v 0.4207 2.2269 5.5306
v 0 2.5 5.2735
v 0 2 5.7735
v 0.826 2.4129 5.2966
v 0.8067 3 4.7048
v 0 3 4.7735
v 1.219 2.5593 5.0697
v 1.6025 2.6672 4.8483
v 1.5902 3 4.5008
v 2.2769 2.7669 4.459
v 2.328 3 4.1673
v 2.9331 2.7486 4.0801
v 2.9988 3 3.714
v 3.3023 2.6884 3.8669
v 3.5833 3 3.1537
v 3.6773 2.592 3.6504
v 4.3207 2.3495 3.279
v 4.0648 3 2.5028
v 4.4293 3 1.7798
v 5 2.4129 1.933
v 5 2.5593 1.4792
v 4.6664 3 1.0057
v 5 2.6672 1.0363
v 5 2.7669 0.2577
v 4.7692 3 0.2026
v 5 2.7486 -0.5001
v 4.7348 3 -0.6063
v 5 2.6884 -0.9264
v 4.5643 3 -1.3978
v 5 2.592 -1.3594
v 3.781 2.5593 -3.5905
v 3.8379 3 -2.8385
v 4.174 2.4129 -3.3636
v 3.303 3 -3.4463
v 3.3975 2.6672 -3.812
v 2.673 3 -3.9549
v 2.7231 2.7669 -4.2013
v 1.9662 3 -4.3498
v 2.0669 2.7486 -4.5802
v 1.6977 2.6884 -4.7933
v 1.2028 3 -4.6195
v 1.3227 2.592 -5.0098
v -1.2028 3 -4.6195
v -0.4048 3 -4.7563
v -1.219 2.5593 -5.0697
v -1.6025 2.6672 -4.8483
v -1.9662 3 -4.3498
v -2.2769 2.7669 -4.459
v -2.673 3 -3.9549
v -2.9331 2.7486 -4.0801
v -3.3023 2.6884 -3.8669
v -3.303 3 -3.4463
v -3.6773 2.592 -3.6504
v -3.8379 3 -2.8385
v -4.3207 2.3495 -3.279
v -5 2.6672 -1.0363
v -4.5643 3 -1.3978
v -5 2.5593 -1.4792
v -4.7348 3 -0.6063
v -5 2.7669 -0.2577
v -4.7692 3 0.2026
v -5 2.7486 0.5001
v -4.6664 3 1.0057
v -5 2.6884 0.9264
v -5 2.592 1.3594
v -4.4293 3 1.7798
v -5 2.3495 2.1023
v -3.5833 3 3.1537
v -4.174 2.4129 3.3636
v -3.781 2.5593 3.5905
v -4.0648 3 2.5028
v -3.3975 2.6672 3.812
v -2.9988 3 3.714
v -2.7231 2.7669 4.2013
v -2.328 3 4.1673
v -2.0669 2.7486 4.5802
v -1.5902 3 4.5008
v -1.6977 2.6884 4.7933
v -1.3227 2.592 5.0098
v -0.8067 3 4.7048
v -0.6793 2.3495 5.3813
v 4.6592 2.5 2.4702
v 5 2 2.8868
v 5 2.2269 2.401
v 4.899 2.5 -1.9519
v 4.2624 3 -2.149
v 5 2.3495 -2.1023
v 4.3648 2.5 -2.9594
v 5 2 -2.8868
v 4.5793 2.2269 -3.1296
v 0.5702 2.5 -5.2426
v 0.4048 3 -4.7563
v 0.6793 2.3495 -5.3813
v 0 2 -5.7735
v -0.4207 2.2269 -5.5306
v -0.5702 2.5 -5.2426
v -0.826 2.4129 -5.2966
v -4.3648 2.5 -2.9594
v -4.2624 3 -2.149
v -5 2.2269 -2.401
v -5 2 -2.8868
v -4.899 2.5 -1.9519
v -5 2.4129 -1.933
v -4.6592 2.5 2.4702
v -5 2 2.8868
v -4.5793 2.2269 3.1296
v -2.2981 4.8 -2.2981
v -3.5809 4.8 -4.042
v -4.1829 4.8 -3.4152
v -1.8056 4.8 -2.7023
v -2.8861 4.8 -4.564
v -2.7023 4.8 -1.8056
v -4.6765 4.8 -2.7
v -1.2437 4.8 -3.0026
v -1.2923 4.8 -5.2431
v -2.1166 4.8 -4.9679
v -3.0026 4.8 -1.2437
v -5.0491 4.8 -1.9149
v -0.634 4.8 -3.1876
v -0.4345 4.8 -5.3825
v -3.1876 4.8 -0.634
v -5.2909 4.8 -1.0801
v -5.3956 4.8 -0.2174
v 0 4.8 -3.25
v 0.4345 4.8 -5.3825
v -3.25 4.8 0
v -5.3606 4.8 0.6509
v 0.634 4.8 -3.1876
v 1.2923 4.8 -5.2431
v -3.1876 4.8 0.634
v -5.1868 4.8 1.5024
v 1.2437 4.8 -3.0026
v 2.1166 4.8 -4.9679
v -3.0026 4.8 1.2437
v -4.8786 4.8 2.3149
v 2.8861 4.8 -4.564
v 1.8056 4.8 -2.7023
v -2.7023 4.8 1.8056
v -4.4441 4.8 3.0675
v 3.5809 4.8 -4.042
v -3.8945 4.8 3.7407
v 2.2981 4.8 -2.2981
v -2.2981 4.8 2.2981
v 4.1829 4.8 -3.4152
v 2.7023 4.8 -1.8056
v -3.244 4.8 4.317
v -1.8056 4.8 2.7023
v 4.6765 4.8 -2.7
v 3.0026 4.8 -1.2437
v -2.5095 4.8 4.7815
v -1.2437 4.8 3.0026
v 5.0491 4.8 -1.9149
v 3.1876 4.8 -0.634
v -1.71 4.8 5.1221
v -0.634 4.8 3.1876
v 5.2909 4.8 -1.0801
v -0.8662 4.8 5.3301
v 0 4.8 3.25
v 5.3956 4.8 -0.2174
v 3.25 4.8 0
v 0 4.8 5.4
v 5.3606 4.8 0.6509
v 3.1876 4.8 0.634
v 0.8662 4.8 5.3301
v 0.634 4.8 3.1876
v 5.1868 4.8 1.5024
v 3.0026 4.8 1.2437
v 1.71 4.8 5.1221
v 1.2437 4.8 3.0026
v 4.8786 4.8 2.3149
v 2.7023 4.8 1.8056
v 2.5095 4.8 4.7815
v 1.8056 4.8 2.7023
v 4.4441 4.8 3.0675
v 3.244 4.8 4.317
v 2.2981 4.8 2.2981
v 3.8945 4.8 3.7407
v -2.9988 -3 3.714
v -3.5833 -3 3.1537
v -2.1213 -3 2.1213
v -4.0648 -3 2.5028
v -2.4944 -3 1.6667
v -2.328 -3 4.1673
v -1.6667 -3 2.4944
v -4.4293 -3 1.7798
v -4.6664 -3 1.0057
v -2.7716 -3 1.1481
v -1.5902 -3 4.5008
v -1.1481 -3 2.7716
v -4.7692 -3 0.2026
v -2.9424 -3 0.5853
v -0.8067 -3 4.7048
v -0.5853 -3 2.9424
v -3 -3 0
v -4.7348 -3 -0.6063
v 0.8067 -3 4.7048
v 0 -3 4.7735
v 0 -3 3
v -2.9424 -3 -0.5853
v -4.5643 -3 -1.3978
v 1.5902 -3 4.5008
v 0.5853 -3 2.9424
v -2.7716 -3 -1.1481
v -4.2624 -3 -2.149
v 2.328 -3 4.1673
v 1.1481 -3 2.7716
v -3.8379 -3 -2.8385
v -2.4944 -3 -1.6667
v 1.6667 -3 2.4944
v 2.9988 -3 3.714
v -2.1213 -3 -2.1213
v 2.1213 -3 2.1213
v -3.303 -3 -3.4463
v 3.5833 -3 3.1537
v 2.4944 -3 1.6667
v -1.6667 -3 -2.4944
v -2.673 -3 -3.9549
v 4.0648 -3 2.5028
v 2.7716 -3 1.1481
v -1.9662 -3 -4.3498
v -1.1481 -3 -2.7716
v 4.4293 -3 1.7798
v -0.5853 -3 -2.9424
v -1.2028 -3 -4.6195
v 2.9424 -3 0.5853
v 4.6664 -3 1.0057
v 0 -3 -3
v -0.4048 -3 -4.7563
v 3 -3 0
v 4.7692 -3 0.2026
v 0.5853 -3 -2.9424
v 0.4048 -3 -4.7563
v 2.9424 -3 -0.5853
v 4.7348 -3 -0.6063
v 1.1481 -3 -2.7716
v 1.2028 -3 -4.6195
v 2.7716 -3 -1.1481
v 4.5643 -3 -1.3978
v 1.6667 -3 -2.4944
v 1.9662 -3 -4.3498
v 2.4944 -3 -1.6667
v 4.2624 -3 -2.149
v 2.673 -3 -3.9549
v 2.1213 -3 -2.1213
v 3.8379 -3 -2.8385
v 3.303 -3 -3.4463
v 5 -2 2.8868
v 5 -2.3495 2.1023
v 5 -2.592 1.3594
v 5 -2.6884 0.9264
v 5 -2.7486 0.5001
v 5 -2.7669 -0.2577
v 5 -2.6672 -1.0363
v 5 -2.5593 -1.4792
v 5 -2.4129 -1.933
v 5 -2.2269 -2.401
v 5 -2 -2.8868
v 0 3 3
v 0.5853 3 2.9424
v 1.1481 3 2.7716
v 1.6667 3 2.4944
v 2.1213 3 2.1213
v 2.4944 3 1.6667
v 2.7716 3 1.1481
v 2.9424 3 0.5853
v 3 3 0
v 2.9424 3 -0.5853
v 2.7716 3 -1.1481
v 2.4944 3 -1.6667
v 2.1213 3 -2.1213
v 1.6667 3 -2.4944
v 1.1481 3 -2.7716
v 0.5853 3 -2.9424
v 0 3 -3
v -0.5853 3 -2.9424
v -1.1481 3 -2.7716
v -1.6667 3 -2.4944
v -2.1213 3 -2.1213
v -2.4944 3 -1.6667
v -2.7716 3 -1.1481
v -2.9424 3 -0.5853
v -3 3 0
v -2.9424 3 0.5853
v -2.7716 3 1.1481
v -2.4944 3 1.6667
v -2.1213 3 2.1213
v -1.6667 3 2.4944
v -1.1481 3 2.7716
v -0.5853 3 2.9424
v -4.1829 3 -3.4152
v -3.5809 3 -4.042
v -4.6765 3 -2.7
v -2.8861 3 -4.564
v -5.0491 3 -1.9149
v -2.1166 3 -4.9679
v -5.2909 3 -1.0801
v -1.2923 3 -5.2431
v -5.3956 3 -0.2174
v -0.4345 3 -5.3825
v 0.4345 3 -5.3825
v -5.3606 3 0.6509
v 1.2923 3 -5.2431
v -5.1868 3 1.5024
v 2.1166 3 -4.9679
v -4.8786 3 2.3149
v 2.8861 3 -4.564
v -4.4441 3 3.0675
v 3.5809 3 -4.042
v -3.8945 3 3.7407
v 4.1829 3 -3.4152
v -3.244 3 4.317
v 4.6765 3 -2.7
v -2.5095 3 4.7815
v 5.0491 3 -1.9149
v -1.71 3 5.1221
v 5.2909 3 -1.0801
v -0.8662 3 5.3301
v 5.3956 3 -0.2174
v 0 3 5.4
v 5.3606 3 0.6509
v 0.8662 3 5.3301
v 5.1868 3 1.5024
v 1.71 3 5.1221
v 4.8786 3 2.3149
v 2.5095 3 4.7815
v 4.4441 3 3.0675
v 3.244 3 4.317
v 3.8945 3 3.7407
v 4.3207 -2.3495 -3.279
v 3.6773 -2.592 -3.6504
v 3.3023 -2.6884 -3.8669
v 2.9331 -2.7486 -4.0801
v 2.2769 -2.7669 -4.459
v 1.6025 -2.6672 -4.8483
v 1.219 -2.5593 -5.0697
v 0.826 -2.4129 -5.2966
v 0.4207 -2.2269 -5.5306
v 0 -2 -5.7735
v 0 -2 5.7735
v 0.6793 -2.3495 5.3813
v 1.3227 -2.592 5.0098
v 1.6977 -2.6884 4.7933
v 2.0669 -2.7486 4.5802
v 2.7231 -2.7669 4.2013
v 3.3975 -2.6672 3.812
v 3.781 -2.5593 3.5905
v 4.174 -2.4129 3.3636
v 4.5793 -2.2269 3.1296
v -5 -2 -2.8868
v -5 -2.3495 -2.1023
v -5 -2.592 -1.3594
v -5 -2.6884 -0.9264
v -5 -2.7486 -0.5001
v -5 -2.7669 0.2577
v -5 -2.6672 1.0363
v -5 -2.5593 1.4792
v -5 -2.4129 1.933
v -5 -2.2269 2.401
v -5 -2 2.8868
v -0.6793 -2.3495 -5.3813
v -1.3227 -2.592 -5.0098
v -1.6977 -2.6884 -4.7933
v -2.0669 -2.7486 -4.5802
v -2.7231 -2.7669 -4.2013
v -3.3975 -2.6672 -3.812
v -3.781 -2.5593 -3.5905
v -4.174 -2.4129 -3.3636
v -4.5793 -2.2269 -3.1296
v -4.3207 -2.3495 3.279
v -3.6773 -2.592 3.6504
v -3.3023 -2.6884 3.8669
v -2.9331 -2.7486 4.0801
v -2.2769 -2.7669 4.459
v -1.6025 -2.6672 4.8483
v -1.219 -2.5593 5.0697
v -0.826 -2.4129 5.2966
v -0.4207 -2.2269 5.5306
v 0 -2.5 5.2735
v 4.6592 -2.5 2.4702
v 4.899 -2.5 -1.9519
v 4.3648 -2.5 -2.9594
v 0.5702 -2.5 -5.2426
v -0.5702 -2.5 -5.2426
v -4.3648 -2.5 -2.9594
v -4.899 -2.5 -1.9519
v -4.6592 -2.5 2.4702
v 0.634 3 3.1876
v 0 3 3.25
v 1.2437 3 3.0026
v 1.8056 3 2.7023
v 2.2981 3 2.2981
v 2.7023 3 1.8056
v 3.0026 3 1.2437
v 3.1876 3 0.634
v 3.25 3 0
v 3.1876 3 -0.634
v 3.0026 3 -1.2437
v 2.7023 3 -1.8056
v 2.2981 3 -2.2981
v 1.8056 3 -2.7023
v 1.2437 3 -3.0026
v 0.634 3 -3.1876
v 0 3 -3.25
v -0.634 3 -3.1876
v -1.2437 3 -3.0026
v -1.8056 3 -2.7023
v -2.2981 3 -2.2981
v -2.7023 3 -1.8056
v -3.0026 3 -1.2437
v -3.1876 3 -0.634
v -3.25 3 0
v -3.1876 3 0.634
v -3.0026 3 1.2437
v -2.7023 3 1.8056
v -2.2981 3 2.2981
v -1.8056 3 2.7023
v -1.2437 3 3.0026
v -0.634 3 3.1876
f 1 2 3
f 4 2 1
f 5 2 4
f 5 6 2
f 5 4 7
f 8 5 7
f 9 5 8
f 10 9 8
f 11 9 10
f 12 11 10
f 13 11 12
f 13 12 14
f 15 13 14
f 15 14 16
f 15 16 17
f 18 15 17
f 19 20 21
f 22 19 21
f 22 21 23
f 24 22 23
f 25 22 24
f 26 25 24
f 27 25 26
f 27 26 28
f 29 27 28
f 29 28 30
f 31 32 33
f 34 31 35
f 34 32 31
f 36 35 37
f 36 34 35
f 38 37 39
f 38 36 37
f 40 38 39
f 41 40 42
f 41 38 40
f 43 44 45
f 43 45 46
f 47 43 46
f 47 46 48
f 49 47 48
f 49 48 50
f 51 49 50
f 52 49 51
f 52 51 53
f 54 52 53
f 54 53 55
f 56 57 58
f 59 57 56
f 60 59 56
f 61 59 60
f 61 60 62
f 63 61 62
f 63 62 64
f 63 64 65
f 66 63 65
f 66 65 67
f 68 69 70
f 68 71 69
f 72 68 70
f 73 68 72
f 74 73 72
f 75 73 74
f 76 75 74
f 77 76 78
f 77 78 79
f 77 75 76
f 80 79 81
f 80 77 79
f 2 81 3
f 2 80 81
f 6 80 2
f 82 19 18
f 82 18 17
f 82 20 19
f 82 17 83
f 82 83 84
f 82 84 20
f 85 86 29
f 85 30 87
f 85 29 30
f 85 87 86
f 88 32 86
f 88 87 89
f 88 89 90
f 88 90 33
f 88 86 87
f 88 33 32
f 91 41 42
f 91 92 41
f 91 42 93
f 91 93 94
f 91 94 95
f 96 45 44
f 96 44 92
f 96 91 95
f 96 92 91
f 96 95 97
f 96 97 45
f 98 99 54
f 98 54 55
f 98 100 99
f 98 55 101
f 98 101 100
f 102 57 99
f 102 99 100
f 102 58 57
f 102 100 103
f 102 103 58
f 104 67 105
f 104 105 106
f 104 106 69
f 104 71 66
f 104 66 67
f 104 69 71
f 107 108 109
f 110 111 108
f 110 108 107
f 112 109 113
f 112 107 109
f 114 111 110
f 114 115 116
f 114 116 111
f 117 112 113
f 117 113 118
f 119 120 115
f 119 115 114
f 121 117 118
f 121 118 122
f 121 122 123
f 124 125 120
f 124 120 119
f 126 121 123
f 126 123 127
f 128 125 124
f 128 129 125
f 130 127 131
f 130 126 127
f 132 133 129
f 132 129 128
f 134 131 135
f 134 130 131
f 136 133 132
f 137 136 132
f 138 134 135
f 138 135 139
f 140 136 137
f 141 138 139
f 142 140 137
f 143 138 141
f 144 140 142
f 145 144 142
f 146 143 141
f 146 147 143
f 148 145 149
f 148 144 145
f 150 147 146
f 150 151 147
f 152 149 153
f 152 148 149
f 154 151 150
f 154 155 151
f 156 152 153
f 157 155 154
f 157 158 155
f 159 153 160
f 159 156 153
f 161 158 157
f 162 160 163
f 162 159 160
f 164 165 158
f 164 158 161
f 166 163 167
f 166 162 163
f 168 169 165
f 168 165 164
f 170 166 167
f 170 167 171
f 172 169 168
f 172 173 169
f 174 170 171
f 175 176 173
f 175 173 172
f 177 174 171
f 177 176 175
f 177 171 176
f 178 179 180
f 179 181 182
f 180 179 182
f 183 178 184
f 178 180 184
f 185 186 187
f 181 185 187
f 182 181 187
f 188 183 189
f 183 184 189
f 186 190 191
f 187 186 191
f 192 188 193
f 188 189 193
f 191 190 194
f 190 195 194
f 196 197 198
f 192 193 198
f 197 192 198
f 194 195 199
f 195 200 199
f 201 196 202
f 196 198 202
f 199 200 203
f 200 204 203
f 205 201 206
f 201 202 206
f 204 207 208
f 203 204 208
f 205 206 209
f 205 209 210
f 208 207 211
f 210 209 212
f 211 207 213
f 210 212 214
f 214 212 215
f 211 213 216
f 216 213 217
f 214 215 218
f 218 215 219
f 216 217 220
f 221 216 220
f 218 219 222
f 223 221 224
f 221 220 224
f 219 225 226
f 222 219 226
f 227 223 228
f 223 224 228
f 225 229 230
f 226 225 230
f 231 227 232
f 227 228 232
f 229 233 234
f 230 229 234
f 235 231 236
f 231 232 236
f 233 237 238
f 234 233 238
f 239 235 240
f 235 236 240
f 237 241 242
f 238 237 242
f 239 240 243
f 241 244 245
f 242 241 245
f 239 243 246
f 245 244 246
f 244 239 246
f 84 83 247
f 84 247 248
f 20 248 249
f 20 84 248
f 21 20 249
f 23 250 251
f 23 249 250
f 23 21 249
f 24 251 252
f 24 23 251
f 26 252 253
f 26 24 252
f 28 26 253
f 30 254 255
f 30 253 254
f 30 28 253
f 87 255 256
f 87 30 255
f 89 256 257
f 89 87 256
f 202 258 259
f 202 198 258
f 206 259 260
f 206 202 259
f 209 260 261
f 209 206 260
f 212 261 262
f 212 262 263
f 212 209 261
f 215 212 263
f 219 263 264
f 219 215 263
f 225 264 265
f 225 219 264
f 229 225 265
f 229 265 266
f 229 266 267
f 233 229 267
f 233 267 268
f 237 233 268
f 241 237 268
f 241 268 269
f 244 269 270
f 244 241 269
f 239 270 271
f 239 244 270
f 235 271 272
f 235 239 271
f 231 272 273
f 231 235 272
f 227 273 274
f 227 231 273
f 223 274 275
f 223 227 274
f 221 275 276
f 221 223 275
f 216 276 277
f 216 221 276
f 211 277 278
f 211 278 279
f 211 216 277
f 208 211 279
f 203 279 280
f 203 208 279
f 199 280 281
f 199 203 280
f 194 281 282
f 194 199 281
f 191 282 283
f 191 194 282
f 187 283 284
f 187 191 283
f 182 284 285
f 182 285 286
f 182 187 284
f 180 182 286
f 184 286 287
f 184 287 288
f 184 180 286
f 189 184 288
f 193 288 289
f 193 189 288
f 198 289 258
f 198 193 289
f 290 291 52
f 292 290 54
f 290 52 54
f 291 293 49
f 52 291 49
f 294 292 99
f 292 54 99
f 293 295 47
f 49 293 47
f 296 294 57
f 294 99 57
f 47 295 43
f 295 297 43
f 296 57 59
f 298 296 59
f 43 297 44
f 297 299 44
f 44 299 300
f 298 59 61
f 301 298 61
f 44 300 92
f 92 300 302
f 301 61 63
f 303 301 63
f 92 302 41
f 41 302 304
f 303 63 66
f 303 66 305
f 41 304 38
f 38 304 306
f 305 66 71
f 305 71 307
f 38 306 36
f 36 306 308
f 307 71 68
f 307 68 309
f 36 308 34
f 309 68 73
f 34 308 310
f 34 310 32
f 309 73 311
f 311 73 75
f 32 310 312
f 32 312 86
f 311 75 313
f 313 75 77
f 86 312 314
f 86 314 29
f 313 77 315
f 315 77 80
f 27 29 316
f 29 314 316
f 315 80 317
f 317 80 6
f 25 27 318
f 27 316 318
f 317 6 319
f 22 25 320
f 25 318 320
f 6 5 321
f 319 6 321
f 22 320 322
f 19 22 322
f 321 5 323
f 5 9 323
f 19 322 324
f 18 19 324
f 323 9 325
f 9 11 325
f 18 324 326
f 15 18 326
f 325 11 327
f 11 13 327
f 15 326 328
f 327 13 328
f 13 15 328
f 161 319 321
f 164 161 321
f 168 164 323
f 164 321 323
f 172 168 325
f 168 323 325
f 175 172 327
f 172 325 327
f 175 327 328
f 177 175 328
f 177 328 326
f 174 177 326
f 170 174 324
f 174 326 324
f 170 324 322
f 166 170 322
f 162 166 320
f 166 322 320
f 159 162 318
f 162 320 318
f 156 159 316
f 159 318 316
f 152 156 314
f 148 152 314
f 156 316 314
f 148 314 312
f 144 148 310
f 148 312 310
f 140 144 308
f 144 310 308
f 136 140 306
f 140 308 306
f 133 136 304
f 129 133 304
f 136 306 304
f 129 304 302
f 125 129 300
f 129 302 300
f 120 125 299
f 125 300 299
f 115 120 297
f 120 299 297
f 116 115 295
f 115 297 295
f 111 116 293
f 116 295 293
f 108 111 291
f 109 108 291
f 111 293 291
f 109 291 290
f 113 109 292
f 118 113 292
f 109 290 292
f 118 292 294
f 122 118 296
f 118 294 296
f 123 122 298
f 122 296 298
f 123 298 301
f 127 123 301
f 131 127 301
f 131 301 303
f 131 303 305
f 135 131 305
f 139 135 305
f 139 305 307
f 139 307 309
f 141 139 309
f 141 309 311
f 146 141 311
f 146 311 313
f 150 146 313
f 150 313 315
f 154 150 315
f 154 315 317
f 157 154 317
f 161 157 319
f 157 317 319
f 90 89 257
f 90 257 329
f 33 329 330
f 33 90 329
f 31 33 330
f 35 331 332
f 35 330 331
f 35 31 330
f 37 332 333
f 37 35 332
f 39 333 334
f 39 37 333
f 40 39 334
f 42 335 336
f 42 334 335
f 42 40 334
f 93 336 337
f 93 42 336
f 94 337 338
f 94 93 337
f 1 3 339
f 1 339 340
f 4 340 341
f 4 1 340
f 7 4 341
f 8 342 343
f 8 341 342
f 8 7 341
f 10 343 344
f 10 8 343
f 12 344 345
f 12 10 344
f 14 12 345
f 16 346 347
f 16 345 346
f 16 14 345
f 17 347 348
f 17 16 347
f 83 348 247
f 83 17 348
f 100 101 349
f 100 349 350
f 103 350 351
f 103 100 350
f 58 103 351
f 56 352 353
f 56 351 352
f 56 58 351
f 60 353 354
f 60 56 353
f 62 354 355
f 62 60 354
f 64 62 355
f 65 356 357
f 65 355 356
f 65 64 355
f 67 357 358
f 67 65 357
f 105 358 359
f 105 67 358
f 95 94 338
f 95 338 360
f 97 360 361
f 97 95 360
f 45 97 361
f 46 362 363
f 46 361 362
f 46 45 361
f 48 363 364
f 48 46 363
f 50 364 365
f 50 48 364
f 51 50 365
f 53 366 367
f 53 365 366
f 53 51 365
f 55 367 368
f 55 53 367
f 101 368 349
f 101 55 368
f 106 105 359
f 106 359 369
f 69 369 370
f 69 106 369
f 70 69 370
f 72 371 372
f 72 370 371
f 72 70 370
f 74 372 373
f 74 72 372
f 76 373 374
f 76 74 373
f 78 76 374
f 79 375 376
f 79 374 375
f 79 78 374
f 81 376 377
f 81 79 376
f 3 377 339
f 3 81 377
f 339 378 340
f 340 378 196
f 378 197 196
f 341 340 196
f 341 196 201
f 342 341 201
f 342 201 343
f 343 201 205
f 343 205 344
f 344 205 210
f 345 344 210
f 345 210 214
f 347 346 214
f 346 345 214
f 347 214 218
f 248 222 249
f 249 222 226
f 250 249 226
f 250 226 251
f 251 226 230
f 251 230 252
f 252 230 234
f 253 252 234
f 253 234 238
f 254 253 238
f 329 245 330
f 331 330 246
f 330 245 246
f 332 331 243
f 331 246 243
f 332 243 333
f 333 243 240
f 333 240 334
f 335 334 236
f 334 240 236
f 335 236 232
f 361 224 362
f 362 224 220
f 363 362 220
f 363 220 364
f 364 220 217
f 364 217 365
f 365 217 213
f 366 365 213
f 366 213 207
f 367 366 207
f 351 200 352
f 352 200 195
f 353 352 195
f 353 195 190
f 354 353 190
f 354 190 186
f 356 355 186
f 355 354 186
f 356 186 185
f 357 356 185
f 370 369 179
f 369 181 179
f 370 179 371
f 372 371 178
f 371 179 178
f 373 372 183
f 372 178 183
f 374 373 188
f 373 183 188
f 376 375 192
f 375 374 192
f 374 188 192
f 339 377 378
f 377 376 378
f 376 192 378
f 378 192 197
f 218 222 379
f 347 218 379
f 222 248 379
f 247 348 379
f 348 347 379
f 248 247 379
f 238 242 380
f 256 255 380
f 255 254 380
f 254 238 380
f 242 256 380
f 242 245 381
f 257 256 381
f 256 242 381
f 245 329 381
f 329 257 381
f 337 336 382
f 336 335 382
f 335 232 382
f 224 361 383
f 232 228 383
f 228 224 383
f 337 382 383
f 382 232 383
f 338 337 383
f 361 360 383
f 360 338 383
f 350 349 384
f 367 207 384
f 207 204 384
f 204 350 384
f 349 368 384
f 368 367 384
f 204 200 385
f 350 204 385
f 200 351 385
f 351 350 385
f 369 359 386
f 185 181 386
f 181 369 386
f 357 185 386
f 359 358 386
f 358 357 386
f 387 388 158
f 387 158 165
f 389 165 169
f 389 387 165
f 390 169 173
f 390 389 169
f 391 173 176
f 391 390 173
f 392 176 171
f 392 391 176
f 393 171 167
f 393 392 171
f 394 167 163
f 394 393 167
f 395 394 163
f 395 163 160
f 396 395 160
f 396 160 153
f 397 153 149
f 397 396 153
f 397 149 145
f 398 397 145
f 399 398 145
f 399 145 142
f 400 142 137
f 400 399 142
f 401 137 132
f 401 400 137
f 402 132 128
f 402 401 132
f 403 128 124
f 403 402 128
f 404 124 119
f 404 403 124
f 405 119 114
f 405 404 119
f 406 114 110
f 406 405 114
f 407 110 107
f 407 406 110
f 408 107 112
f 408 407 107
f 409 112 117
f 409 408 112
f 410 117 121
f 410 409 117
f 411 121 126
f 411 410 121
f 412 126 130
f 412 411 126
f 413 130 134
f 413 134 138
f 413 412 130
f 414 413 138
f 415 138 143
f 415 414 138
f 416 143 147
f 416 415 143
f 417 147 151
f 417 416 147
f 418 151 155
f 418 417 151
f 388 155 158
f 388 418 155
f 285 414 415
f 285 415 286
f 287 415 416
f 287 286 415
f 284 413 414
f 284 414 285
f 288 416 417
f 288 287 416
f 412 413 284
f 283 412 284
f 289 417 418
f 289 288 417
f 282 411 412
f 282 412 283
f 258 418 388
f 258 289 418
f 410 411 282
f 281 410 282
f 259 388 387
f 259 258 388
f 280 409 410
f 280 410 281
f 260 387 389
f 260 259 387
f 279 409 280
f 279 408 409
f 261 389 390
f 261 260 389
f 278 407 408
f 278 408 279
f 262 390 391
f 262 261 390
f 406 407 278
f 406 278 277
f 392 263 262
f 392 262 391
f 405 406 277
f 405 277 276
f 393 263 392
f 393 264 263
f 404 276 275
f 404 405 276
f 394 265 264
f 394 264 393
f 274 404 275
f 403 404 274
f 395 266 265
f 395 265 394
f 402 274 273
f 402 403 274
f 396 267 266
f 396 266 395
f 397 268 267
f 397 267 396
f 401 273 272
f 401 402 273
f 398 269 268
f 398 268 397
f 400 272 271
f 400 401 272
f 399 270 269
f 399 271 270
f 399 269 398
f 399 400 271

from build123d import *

# Parameters (mm, degrees)
SZKIC1_R                    = 3
DODANIE_WYCI_GNI_CIE1_DEPTH = 3
SZKIC4_R                    = 5.4
SZKIC4_R_2                  = 3.25
DODANIE_WYCI_GNI_CIE2_DEPTH = 1.8


with BuildPart() as part:
    # Szkic1 → Dodanie-wyciągnięcie1 (new, symmetric)
    with BuildSketch(Plane(origin=(0, 0, 0), x_dir=(1, 0, 0), z_dir=(0, 1, 0))):
        Polygon((5, -2.886751346), (5, 2.886751346), (0, 5.773502692), (-5, 2.886751346), (-5, -2.886751346), (0, -5.773502692), align=None)
        with Locations(Location((0, 0, 0), (0, 0, 270))):
            Circle(SZKIC1_R, mode=Mode.SUBTRACT)
    extrude(amount=DODANIE_WYCI_GNI_CIE1_DEPTH, both=True)

    # Szkic3 → Wycięcie-obrót9 (revolve, cut)
    with BuildSketch(Plane(origin=(0, 0, 0), x_dir=(0, 0, -1), z_dir=(1, 0, 0)), mode=Mode.PRIVATE) as wyci_cie_obr_t9_sk:
        Polygon((5.773502692, 3), (5.773502692, 2), (4.773502692, 3), align=None)
        Polygon((4.773502692, -3), (5.773502692, -3), (5.773502692, -2), align=None)
    revolve(wyci_cie_obr_t9_sk.sketch.rotate(Axis((0, 0, 0), (0, 1, 0)), 180), axis=Axis((0, 0, 0), (0, 1, 0)), mode=Mode.SUBTRACT)

    # Szkic4 → Dodanie-wyciągnięcie2 (add)
    with BuildSketch(Plane(origin=(0, 3, 0), x_dir=(1, 0, 0), z_dir=(0, 1, 0))):
        with Locations(Location((0, 0, 0), (0, 0, 270))):
            Circle(SZKIC4_R)
        with Locations(Location((0, 0, 0), (0, 0, 270))):
            Circle(SZKIC4_R_2, mode=Mode.SUBTRACT)
    extrude(amount=DODANIE_WYCI_GNI_CIE2_DEPTH)


solid = part.part
